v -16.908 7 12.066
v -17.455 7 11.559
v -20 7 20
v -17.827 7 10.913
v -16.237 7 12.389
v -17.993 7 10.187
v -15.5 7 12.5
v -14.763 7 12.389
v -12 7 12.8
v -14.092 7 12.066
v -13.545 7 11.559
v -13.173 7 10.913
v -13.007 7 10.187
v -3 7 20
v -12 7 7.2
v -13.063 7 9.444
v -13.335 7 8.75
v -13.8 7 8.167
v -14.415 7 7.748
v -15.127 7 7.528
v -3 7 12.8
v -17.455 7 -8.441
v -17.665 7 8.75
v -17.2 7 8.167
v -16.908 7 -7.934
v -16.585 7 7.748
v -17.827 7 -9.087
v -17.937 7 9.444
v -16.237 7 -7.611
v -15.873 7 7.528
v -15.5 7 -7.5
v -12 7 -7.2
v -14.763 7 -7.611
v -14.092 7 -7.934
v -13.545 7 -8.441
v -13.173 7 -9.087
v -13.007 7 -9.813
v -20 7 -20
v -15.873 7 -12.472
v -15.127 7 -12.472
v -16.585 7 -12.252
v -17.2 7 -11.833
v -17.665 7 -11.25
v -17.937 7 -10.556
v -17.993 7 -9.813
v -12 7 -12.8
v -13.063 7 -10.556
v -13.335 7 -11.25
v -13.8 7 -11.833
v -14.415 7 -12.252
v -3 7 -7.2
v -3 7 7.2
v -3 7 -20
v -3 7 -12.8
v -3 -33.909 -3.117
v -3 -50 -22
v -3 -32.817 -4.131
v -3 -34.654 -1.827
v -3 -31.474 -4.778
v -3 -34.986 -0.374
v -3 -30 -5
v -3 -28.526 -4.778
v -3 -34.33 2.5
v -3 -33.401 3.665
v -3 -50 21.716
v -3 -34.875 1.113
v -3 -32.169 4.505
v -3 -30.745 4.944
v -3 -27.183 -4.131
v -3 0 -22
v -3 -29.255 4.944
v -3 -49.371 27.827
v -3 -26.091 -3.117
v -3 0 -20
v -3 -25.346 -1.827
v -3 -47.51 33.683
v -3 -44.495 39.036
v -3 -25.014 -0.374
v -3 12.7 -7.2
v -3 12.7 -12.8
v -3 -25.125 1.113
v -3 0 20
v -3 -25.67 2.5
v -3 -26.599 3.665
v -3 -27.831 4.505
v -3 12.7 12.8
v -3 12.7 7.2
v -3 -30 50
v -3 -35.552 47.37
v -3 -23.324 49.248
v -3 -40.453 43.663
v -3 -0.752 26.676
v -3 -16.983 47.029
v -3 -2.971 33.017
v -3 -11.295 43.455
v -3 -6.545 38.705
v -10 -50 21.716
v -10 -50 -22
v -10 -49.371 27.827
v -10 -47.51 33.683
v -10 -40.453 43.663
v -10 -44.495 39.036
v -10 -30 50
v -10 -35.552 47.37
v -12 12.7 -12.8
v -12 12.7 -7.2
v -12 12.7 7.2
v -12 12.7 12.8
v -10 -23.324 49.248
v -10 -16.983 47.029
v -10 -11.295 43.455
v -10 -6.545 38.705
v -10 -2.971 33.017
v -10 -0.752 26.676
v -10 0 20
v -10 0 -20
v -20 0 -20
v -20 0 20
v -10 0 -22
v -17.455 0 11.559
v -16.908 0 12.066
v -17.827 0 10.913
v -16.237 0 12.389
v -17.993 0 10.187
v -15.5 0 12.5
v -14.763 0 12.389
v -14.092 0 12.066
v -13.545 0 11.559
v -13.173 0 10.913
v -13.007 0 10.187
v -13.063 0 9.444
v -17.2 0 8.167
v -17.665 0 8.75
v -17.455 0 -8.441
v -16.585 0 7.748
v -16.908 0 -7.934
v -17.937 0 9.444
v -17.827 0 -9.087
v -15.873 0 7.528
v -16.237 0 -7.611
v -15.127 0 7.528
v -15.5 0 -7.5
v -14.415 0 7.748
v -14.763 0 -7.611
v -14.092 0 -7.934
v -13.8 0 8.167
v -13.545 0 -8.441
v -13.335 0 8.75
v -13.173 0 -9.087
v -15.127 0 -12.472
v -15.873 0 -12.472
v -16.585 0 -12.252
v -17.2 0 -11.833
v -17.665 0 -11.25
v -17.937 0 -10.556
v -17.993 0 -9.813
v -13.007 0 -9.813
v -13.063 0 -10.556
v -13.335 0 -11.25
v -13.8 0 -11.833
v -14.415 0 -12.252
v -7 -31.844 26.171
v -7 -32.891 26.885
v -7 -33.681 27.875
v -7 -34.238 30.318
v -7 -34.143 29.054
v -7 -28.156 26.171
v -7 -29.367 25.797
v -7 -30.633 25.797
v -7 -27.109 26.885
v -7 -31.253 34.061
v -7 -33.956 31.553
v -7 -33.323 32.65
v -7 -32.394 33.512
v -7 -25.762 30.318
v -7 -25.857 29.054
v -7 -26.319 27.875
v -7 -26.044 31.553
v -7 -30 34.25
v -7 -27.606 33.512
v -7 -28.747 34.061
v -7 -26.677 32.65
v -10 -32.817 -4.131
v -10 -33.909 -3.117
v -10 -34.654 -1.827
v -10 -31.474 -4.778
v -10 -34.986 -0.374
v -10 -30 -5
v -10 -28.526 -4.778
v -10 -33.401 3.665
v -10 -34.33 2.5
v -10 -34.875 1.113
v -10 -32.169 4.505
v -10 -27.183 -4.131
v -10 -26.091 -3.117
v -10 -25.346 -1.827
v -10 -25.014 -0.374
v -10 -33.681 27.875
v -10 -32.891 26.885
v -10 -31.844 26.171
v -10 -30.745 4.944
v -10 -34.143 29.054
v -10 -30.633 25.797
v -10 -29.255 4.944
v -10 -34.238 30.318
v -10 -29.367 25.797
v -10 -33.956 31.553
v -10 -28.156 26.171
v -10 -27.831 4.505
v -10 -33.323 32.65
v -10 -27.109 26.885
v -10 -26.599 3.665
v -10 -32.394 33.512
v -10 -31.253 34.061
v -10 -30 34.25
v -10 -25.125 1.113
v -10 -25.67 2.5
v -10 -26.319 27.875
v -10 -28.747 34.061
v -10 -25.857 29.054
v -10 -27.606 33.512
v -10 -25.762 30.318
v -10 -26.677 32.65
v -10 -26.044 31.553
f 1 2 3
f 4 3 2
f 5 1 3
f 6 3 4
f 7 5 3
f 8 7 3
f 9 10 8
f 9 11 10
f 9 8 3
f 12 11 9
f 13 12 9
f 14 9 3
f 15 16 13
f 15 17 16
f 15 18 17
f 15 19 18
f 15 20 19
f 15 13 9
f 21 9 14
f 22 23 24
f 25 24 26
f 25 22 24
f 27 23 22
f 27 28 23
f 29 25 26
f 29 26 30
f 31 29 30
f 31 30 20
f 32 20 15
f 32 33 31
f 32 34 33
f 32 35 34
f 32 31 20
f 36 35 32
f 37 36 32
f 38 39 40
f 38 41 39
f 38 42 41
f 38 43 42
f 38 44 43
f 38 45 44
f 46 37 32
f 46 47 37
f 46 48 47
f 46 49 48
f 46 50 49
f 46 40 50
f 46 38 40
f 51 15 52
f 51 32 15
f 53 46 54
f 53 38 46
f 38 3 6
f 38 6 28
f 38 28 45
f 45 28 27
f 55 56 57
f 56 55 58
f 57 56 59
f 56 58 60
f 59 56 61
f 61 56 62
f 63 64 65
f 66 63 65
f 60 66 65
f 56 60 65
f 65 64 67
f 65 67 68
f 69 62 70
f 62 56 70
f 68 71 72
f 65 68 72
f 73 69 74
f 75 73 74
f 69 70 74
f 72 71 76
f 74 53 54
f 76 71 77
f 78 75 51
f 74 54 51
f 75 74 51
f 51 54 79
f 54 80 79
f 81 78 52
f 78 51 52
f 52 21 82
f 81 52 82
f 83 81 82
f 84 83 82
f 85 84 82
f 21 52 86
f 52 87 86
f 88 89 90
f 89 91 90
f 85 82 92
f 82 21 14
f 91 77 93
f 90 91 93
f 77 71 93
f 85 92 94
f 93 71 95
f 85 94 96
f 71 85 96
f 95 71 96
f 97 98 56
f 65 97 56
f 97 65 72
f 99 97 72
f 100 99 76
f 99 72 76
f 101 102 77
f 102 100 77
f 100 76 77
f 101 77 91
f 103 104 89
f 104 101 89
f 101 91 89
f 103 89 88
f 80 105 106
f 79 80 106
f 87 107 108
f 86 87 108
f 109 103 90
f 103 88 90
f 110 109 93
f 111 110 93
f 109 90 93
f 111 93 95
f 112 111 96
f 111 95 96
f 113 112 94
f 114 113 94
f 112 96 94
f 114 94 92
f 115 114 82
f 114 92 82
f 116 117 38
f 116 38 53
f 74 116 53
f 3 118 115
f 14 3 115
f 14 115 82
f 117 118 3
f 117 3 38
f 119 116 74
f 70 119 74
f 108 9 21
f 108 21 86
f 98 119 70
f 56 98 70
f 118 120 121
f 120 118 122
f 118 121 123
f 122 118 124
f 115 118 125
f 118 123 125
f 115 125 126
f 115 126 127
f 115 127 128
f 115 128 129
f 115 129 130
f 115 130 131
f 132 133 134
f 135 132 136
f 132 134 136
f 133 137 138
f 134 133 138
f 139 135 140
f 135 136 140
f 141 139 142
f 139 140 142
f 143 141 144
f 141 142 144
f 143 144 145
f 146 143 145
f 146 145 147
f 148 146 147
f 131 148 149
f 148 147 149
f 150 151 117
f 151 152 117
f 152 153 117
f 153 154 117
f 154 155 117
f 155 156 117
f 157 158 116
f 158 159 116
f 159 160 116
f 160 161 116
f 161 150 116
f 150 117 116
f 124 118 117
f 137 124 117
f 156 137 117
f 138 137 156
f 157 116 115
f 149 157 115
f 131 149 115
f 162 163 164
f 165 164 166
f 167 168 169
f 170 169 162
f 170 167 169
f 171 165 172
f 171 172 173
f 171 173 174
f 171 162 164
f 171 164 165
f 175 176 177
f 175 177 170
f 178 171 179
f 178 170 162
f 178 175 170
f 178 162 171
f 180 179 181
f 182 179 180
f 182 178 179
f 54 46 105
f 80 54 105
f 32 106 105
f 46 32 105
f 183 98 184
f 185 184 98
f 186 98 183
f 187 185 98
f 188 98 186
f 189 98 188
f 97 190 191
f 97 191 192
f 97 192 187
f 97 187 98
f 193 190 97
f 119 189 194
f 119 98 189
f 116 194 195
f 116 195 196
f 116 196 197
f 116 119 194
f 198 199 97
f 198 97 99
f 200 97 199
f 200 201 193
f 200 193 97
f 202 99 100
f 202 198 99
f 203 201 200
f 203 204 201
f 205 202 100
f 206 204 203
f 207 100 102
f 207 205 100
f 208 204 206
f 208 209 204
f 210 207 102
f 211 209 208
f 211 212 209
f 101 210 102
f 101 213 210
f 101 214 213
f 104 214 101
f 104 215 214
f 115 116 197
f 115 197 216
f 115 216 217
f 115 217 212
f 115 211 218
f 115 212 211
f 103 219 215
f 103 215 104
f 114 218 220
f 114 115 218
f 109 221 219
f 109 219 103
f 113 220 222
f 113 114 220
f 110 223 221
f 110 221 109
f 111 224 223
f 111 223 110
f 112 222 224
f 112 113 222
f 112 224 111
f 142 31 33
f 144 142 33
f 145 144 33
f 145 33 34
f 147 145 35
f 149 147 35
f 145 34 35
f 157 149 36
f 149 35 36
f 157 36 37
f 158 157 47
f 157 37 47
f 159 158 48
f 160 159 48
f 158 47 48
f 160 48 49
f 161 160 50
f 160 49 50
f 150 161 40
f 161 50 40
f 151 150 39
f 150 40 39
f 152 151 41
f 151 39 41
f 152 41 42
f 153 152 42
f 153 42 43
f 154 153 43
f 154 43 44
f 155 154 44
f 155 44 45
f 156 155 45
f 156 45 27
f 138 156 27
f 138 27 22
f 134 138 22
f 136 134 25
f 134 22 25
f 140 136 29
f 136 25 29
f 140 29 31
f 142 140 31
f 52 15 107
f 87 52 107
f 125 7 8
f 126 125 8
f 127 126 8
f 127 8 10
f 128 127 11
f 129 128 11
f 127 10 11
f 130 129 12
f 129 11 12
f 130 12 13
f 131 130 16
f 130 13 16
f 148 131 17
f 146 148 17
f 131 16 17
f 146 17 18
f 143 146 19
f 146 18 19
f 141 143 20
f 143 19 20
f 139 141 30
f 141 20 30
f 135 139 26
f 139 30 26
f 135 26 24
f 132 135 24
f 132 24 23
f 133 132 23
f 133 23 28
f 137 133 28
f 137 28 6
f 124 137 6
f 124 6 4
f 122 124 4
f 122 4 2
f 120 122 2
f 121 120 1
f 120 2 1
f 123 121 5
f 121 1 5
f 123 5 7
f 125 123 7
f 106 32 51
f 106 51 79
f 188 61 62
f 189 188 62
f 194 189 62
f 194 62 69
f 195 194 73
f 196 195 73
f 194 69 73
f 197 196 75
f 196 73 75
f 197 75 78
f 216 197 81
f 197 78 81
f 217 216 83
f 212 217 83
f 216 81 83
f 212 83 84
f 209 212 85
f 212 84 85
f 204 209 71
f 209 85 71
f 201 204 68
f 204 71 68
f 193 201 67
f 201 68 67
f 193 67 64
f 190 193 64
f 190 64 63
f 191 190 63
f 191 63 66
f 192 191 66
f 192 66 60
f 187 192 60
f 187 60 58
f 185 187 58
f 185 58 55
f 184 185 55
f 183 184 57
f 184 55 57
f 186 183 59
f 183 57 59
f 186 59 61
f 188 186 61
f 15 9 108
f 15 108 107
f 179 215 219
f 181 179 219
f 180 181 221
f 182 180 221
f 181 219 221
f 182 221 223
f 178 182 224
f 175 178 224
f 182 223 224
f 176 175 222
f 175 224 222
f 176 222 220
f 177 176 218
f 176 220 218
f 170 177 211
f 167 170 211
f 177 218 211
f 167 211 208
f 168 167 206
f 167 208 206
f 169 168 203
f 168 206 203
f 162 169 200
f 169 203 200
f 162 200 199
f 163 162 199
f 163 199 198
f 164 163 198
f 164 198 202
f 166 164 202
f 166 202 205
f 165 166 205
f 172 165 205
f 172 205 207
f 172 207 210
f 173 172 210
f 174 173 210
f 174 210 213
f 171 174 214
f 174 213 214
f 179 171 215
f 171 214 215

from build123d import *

# Parameters (mm, degrees)
CROQUIS1_W              = 40
CROQUIS1_H              = 40
SALIENTE_EXTRUIR1_DEPTH = 7
CROQUIS3_W              = 5.6
CROQUIS3_H              = 5.7
SALIENTE_EXTRUIR3_DEPTH = 40
CROQUIS19_W             = 8
CROQUIS19_H             = 40
CORTAR_EXTRUIR5_DEPTH   = 5.7
CROQUIS20_R             = 2.5
CORTAR_EXTRUIR6_DEPTH   = 7
CROQUIS21_W             = 7
CROQUIS21_H             = 72
SALIENTE_EXTRUIR4_DEPTH = 50
CROQUIS22_R             = 5
CORTAR_EXTRUIR7_DEPTH   = 7
REDONDEO1_R             = 30
REDONDEO2_R             = 30
CROQUIS28_R             = 4.25
CORTAR_EXTRUIR11_DEPTH  = 3
CROQUIS29_W             = 113.908789422
CROQUIS29_H             = 183.564538758
CORTAR_EXTRUIR12_DEPTH  = 23


# Some blends are built 0.0001 mm under size
with BuildPart() as part:
    # Croquis1 → Saliente-Extruir1 (new body)
    with BuildSketch(Plane(origin=(0, 0, 0), x_dir=(1, 0, 0), z_dir=(0, 1, 0))):
        Rectangle(CROQUIS1_W, CROQUIS1_H)
    extrude(amount=SALIENTE_EXTRUIR1_DEPTH)

    # Croquis3 → Saliente-Extruir3 (add)
    with BuildSketch(Plane.ZY.offset(20)):
        with Locations((10, 9.85)):
            Rectangle(CROQUIS3_W, CROQUIS3_H)
        with Locations((-10, 9.85)):
            Rectangle(CROQUIS3_W, CROQUIS3_H)
    extrude(amount=-SALIENTE_EXTRUIR3_DEPTH)

    # Croquis19 → Cortar-Extruir5 (cut)
    with BuildSketch(Plane(origin=(0, 12.7, 0), x_dir=(1, 0, 0), z_dir=(0, 1, 0))):
        with Locations((-16, 0)):
            Rectangle(CROQUIS19_W, CROQUIS19_H)
        with Locations((16, 0)):
            Rectangle(CROQUIS19_W, CROQUIS19_H)
    extrude(amount=-CORTAR_EXTRUIR5_DEPTH, mode=Mode.SUBTRACT)

    # Croquis20 → Cortar-Extruir6 (cut)
    with BuildSketch(Plane(origin=(0, 7, 0), x_dir=(1, 0, 0), z_dir=(0, 1, 0))):
        with Locations(Location((-15.5, 10, 0), (0, 0, 270))):
            Circle(CROQUIS20_R)
        with Locations(Location((15.5, 10, 0), (0, 0, 270))):
            Circle(CROQUIS20_R)
        with Locations(Location((15.5, -10, 0), (0, 0, 270))):
            Circle(CROQUIS20_R)
        with Locations(Location((-15.5, -10, 0), (0, 0, 270))):
            Circle(CROQUIS20_R)
    extrude(amount=-CORTAR_EXTRUIR6_DEPTH, mode=Mode.SUBTRACT)

    # Croquis21 → Saliente-Extruir4 (add)
    with BuildSketch(Plane.XZ):
        with Locations((-6.5, 14)):
            Rectangle(CROQUIS21_W, CROQUIS21_H)
    extrude(amount=SALIENTE_EXTRUIR4_DEPTH)

    # Croquis22 → Cortar-Extruir7 (cut)
    with BuildSketch(Plane(origin=(-3, 0, 0), x_dir=(0, 0, -1), z_dir=(1, 0, 0))):
        with Locations((0, -30)):
            Circle(CROQUIS22_R)
    extrude(amount=-CORTAR_EXTRUIR7_DEPTH, mode=Mode.SUBTRACT)

    # Redondeo1
    redondeo1_edges = [part.edges().sort_by_distance(p)[0] for p in [
        (-6.5, 0, 50),
    ]]
    fillet(redondeo1_edges, radius=REDONDEO1_R - 0.0001)  # a hair under: the kernel refuses the full size

    # Redondeo2
    # the kernel refuses this fillet: 30 mm, written as the material it takes off along each edge
    with BuildSketch(Plane(origin=(67.710766507, -50, 50), x_dir=(0, 1, 0), z_dir=(-1, 0, 0))) as redondeo2_piece_1:
        with BuildLine():
            CenterArc((30, 28.284306603), REDONDEO2_R, 180, 70.528981937)
            Line((0, 28.284306603), (-0.6, 28.284306603))
            Line((-0.6, 28.284306603), (-0.6, 0))
            Line((-0.6, 0), (0, -0.6))
            ThreePointArc((0, -0.6), (10.00005, -0.6), (19.800102, -0.565686132))
            Line((19.800102, -0.565686132), (20.0001, 0))
        make_face()
    extrude(amount=148.421533013, mode=Mode.SUBTRACT)

    # Croquis28 → Cortar-Extruir11 (cut)
    with BuildSketch(Plane.ZY.offset(10)):
        with Locations((30, -30)):
            Circle(CROQUIS28_R)
    extrude(amount=-CORTAR_EXTRUIR11_DEPTH, mode=Mode.SUBTRACT)

    # Croquis29 → Cortar-Extruir12 (cut)
    with BuildSketch(Plane(origin=(20, 0, 0), x_dir=(0, 0, -1), z_dir=(1, 0, 0))):
        with Locations((0, 4.197692072)):
            Rectangle(CROQUIS29_W, CROQUIS29_H)
    extrude(amount=-CORTAR_EXTRUIR12_DEPTH, mode=Mode.SUBTRACT)


solid = part.part
